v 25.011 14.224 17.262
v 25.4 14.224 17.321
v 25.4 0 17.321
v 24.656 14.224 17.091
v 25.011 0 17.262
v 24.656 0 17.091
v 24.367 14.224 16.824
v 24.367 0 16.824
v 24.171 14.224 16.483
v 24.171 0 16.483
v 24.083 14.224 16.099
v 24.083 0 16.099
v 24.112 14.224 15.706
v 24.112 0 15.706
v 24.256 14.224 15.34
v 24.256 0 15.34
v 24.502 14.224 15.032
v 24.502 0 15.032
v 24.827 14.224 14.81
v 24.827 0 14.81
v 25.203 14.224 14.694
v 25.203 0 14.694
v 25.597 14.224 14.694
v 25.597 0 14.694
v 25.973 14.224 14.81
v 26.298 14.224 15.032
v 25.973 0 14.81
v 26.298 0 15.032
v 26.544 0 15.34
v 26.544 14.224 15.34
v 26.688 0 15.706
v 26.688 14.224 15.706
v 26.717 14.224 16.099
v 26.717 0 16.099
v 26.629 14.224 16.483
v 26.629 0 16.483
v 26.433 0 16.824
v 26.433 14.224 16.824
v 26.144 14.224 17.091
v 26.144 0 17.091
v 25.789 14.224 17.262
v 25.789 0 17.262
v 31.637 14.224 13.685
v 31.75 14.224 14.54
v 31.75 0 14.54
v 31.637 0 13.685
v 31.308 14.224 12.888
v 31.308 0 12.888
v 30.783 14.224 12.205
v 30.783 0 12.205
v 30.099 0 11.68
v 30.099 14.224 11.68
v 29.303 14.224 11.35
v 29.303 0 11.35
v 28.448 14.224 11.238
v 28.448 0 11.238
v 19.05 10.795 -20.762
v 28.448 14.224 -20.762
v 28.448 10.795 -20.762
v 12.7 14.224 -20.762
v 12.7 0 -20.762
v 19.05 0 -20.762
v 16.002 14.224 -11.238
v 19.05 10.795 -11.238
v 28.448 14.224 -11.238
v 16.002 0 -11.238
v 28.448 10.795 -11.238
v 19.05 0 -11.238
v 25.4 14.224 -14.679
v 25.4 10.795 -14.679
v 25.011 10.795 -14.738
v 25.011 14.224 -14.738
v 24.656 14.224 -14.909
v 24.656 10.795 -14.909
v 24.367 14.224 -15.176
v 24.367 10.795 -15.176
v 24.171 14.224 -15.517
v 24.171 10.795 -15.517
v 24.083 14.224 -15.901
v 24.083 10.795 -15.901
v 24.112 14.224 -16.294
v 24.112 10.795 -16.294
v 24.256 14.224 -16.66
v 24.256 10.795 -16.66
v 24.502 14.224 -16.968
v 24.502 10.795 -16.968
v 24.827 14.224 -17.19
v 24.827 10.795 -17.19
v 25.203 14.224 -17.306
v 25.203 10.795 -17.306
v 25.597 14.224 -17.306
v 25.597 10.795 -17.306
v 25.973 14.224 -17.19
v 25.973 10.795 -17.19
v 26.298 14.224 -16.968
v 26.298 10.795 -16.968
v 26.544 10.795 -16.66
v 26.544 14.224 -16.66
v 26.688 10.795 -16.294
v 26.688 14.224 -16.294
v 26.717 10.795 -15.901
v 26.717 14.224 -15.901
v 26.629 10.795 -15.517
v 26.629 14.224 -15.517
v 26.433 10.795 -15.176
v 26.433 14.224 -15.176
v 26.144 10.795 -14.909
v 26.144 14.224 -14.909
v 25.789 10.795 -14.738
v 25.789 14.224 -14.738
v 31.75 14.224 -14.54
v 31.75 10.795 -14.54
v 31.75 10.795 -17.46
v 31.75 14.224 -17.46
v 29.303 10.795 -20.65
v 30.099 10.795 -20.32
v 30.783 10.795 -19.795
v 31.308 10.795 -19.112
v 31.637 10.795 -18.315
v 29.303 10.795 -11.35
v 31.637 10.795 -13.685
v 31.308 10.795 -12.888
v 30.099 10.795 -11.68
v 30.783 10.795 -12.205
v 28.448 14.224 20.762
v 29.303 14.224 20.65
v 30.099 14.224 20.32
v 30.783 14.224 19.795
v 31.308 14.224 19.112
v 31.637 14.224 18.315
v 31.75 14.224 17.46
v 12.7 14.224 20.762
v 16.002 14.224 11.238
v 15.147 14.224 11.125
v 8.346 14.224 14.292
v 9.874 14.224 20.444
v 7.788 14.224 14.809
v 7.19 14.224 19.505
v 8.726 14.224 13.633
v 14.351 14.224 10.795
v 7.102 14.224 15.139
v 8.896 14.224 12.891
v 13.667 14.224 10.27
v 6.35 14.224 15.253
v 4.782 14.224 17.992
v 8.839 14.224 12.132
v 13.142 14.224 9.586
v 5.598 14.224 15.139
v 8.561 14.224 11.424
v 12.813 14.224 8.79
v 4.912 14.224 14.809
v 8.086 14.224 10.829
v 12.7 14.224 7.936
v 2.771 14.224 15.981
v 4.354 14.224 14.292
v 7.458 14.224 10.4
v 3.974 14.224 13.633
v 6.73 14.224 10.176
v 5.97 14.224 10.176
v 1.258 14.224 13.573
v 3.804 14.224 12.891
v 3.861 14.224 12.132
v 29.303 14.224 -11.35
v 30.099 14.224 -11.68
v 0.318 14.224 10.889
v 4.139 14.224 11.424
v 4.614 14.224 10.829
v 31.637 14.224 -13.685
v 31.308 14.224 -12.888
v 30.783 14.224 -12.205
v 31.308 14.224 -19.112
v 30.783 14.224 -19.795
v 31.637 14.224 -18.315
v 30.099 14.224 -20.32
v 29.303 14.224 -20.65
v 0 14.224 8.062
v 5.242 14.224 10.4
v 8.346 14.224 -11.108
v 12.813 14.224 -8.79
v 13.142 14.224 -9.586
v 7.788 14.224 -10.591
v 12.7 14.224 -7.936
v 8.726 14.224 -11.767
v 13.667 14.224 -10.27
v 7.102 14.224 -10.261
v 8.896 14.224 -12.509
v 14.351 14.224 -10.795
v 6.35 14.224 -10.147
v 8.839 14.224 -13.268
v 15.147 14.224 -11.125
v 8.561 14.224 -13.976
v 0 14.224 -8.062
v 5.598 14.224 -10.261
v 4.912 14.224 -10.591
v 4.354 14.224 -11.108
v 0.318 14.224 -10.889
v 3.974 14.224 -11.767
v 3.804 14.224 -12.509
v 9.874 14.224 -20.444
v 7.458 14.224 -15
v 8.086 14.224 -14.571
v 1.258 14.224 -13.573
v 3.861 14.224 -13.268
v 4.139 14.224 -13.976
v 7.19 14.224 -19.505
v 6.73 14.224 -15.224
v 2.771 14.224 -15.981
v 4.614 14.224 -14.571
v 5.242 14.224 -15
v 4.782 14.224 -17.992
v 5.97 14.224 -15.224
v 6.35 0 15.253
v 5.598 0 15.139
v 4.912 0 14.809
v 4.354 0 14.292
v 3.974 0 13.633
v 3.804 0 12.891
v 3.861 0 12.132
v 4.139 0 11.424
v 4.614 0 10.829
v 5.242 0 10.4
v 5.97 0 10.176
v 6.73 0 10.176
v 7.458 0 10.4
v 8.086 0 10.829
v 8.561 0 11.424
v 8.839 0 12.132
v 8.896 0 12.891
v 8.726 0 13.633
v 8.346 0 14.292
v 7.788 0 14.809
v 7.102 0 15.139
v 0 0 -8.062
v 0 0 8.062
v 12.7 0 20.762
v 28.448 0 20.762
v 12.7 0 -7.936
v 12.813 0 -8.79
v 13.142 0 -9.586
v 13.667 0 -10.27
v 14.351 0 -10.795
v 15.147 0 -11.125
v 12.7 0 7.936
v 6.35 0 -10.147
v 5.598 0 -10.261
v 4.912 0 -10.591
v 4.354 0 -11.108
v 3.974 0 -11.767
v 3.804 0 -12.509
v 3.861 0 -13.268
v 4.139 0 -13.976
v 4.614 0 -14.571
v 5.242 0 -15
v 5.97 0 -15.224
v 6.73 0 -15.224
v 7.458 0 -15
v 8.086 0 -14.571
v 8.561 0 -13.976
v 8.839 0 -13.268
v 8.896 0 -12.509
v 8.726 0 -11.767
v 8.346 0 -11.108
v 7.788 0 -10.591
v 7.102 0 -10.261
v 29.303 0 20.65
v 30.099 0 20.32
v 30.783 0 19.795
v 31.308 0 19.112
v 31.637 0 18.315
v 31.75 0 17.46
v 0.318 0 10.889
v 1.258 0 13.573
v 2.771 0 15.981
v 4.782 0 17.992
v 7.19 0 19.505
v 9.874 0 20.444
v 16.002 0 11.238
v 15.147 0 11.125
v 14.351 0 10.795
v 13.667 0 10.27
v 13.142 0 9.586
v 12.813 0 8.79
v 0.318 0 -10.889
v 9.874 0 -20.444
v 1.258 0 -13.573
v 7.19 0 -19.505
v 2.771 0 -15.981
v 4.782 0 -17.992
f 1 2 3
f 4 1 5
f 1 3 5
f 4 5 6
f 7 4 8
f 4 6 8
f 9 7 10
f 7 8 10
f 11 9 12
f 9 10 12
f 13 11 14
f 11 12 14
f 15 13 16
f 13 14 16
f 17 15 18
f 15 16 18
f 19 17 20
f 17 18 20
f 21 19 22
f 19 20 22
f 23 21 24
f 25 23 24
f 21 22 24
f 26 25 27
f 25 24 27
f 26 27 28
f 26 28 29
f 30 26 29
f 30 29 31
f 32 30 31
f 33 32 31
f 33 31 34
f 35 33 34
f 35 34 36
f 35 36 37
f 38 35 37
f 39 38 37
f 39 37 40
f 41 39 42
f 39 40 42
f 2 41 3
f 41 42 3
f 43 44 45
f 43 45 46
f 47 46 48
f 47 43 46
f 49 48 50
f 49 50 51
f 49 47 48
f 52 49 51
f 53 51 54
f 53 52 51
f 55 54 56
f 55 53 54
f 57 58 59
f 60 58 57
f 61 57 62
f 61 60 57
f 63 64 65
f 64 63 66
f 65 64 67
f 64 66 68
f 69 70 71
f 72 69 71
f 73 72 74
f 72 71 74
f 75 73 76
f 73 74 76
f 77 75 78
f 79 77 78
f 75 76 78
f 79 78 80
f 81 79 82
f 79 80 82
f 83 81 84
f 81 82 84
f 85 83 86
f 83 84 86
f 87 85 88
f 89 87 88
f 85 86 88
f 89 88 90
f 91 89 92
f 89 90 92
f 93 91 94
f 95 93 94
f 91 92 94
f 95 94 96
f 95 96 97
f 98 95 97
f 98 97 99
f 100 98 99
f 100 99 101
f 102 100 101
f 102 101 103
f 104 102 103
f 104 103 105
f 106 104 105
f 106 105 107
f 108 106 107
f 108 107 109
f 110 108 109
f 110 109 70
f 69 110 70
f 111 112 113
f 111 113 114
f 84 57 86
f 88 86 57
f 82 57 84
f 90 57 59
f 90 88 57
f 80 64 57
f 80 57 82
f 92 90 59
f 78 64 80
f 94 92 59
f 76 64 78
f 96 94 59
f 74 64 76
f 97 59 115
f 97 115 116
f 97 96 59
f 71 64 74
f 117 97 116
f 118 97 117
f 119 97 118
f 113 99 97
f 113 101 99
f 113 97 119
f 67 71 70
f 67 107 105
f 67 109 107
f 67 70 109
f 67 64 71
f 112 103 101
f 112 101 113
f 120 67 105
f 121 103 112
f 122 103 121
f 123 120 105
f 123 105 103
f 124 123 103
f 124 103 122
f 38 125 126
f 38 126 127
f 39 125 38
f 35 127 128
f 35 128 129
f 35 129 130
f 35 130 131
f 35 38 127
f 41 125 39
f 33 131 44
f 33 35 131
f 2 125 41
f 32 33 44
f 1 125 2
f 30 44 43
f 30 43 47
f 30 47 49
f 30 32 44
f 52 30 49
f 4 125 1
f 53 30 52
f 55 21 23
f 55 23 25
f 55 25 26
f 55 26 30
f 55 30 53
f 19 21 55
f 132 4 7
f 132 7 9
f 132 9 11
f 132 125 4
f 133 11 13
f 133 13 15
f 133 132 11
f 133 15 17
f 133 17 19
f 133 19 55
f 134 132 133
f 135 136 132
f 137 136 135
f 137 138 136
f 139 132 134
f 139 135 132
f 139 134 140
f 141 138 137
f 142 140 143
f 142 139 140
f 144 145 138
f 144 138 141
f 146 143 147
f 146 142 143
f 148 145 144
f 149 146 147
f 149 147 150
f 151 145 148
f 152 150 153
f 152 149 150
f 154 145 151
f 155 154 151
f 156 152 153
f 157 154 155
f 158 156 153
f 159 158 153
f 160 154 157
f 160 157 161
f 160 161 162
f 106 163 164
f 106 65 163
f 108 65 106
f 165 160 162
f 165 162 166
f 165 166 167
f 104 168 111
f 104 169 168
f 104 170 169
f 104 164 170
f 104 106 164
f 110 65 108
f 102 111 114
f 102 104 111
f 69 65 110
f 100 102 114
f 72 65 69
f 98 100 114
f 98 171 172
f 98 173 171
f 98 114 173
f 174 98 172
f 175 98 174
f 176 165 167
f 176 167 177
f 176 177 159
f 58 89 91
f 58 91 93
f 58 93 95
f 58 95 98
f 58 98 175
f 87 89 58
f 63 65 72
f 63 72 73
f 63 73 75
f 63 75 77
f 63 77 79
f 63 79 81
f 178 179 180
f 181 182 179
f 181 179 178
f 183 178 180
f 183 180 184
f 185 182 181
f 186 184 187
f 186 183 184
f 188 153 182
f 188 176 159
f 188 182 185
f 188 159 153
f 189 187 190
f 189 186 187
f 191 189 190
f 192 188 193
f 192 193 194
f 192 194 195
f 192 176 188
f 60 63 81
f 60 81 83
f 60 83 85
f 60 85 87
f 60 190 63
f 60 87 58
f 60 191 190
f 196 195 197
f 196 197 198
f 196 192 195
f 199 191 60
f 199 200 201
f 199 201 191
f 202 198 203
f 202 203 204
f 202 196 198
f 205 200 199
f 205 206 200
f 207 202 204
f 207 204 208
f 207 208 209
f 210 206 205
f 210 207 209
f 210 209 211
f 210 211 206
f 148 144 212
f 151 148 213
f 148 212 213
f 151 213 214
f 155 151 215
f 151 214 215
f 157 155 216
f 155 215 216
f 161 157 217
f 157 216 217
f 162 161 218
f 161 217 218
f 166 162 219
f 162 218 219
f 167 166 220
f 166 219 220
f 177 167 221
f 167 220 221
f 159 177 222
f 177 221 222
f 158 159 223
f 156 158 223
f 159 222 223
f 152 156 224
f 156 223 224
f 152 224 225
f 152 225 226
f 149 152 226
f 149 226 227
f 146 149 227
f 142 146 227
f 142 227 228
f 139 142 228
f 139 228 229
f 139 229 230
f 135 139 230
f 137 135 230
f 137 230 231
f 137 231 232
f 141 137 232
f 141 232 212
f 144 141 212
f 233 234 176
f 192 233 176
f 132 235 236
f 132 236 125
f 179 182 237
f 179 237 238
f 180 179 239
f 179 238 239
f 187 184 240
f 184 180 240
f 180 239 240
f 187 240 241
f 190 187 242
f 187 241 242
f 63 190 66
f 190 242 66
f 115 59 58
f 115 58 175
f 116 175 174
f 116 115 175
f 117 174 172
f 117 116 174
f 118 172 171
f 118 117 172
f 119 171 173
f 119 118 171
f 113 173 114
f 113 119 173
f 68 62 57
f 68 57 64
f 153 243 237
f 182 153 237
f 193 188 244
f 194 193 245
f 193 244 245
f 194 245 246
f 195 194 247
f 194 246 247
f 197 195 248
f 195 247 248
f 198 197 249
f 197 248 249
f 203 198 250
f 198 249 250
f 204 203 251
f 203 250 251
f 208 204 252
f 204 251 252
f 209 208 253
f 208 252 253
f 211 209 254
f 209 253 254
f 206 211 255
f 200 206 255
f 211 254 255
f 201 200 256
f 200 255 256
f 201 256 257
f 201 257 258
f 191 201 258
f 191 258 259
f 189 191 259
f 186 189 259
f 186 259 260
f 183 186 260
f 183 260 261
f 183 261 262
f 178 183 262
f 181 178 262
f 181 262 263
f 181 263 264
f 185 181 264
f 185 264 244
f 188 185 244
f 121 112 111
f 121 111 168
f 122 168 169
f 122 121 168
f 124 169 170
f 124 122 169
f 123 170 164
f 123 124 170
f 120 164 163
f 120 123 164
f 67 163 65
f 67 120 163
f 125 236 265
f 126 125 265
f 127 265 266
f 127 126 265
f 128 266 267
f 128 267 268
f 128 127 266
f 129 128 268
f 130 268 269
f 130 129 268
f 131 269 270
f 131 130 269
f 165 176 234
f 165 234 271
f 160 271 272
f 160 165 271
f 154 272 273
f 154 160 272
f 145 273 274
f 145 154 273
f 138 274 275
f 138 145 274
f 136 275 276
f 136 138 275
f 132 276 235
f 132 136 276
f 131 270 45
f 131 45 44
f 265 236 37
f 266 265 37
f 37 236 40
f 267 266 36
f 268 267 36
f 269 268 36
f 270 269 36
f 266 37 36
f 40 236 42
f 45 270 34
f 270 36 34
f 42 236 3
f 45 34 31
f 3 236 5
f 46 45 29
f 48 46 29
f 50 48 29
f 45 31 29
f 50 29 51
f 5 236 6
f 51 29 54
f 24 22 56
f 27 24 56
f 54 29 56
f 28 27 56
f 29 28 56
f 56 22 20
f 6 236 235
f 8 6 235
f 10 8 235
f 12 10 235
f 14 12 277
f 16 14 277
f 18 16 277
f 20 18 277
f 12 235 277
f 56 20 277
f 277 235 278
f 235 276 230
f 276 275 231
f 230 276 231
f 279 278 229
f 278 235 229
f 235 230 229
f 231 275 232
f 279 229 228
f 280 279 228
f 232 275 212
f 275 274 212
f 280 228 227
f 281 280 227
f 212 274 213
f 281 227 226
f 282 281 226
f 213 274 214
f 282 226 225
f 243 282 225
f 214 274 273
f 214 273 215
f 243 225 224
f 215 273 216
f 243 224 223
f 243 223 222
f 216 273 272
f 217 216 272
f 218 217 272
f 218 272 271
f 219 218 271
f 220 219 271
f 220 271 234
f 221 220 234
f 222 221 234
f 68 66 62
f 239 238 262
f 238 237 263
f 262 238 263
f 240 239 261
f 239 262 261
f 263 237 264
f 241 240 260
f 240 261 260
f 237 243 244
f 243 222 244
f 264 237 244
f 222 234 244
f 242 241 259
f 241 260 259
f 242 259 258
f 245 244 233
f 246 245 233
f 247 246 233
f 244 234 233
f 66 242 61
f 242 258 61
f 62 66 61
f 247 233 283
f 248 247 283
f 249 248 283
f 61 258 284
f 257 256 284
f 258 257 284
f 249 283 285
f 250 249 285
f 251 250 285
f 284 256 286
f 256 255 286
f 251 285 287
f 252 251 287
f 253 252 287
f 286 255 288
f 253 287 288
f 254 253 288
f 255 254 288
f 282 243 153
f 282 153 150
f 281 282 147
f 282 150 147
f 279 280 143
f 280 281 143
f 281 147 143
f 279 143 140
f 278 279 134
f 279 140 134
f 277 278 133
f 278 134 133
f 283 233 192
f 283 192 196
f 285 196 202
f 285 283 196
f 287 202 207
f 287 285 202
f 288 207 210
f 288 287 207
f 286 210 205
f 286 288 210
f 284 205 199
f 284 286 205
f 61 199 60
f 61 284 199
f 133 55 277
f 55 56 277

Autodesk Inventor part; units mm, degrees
ref_plane "YZ Plane" through (0, 0, 0) normal (1, 0, 0) x (0, 1, 0)
ref_plane "XZ Plane" through (0, 0, 0) normal (0, 1, 0) x (-1, 0, 0)
ref_plane "XY Plane" through (0, 0, 0) normal (0, 0, 1) x (1, 0, 0)
sketch "Sketch1" plane through (0, 0, 0) normal (1, 0, 0) x (0, 1, 0)
  line L0 (0, 20.7625) -> (0, -20.7625)
  line L1 (0, 20.7625) -> (14.224, 20.7625)
  line L2 (14.224, 20.7625) -> (14.224, 11.2375)
  line L3 (14.224, 11.2375) -> (6.35, 11.2375)
  line L4 (6.35, 11.2375) -> (6.35, -11.2375)
  line L5 (6.35, -11.2375) -> (14.224, -11.2375)
  line L6 (14.224, -11.2375) -> (14.224, -20.7625)
  line L7 (14.224, -20.7625) -> (0, -20.7625)
  point P0 (0, 0)
  point P1 (0, 0)
  point P2 (14.224, -16)
  point P3 (14.224, 16)
  dimension "d1" = 32
  dimension "d2" = 7.874
  dimension "d4" = 6.35
  dimension "d5" = 9.525
extrude "Extrusion1" add sketch "Sketch1" along normal blind 31.75
sketch "Sketch2" plane through (0, 14.224, 20.7625) normal (0, 1, 0) x (1, 0, 0)
  line L0 (0, 9.525) -> (31.75, 9.525) construction
  line L1 (31.75, 9.525) -> (31.75, 0) construction
  line L2 (31.75, 0) -> (0, 0) construction
  line L3 (0, 0) -> (0, 9.525) construction
  line L4 (0, 41.525) -> (31.75, 41.525) construction
  line L5 (31.75, 41.525) -> (31.75, 32) construction
  line L6 (31.75, 32) -> (0, 32) construction
  line L7 (0, 32) -> (0, 41.525) construction
  point P0 (0, 20.7625)
  point P1 (25.4, 4.7625)
  point P2 (25.4, 36.7625)
  point P3 (31.75, 4.7625)
  point P4 (31.75, 36.7625)
  dimension "d8" = 6.35
hole "Hole1" at (25.4, 14.224, 16) at (25.4, 14.224, -16) direction (0, -1, 0) diameter 2.6416 end through all thread size "6-32 UNC" class "2B" standard "ANSI Unified Screw Threads"
sketch "Sketch4" plane through (0, 6.35, 11.2375) normal (0, 1, 0) x (1, 0, 0)
  circle A0 centre (25.4, -4.7625) radius 1.3208 construction
  circle A1 centre (25.4, 27.2375) radius 1.3208 construction
  line L0 (0, 32) -> (31.75, 32) construction
  line L1 (31.75, 32) -> (31.75, 22.475) construction
  line L2 (31.75, 22.475) -> (0, 22.475) construction
  line L3 (0, 0) -> (0, 22.475) construction
  line L4 (0, 0) -> (31.75, 0) construction
  line L5 (31.75, 0) -> (31.75, -9.525) construction
  line L6 (31.75, -9.525) -> (0, -9.525) construction
  line L7 (0, -9.525) -> (0, 0) construction
  line L8 (0, 22.475) -> (0, 32) construction
  line L9 (31.75, 22.475) -> (31.75, 0) construction
  line L10 (0, 22.475) -> (31.75, 22.475) construction
  line L11 (31.75, 0) -> (12.7, 0)
  line L12 (12.7, 0) -> (12.7, 22.475)
  line L13 (12.7, 22.475) -> (31.75, 22.475)
  line L14 (31.75, 22.475) -> (31.75, 0)
  point P0 (0, 11.2375)
  point P1 (14.7922, 22.475)
  dimension "d25" = 19.05
extrude "Extrusion2" cut sketch "Sketch4" along normal mid plane 38.1
sketch "Sketch5" plane through (0, 14.224, 20.7625) normal (0, 1, 0) x (1, 0, 0)
  line L0 (0, 0) -> (0, 41.525) construction
  line L1 (0, 41.525) -> (31.75, 41.525) construction
  line L2 (0, 41.525) -> (12.7, 41.525)
  line L3 (12.7, 41.525) -> (12.7, 0.1925)
  line L4 (12.7, 0.1925) -> (0, 0.1925)
  line L5 (0, 0.1925) -> (0, 41.525)
  line L6 (12.7, 9.525) -> (12.7, 32) construction
  point P0 (0, 20.7625)
extrude "Extrusion3" add sketch "Sketch5" against normal up to surface (7.874 mm away)
sketch "Sketch6" plane through (0, 14.224, 20.7625) normal (0, 1, 0) x (1, 0, 0)
  line L0 (6.35, 8.0625) -> (6.35, 33.4625) construction
  line L1 (0, 41.525) -> (0, 0) construction
  point P0 (0, 20.7625)
  point P1 (6.35, 20.7625)
  point P2 (0, 20.7625)
  dimension "d30" = 6.35
  dimension "d31" = 25.4
hole "Hole3" at (6.35, 14.224, 12.7) at (6.35, 14.224, -12.7) direction (0, -1, 0) diameter 5.1054 end through all clearance for "Flat Head Machine Screw (82)" size "#10" standard "Ansi Unified Screw Threads"
fillet "Fillet1" radius 12.7 2 edges at (0, 7.112, -20.7625) (0, 7.112, 20.7625)
fillet "Fillet2" radius 3.302 6 edges at (12.7, 7.112, -11.2375) (12.7, 7.112, 11.2375) (31.75, 7.112, 20.7625) (31.75, 7.112, 11.2375) (31.75, 7.112, -11.2375) (31.75, 7.112, -20.7625)
sketch "Sketch7" plane through (0, 0, -8.0625) normal (0, -1, 0) x (1, 0, 0)
  arc A0 (16.002, 19.3) -> (12.7, 15.998) centre (16.002, 15.998) ccw construction
  line L0 (12.7, 15.998) -> (12.7, 0.127) construction
  arc A1 (12.7, 0.127) -> (16.002, -3.175) centre (16.002, 0.127) ccw construction
  line L1 (16.002, -3.175) -> (28.448, -3.175) construction
  arc A2 (31.75, -6.477) -> (28.448, -3.175) centre (28.448, -6.477) ccw projected
  line L2 (31.75, -6.477) -> (31.75, -9.398) projected
  arc A3 (28.448, -12.7) -> (31.75, -9.398) centre (28.448, -9.398) ccw projected
  line L3 (28.448, -12.7) -> (12.7, -12.7) construction
  arc A4 (0, 0) -> (12.7, -12.7) centre (12.7, 0) ccw construction
  line L4 (0, 0) -> (0, 16.125) construction
  arc A5 (12.7, 28.825) -> (0, 16.125) centre (12.7, 16.125) ccw construction
  line L5 (12.7, 28.825) -> (28.448, 28.825) construction
  arc A6 (31.75, 25.523) -> (28.448, 28.825) centre (28.448, 25.523) ccw construction
  line L6 (31.75, 25.523) -> (31.75, 22.602) construction
  arc A7 (28.448, 19.3) -> (31.75, 22.602) centre (28.448, 22.602) ccw construction
  line L7 (28.448, 19.3) -> (16.002, 19.3) construction
  circle A8 centre (6.35, 20.7625) radius 2.5527 construction
  circle A9 centre (6.35, -4.6375) radius 2.5527 construction
  circle A10 centre (25.4, 24.0625) radius 1.3208 construction
  circle A11 centre (25.4, -7.9375) radius 1.3208 projected
  line L8 (12.7, -12.7) -> (28.448, -12.7) construction
  line L9 (28.448, -12.7) -> (19.05, -12.7)
  line L10 (19.05, -12.7) -> (19.05, -3.175)
  line L11 (16.002, -3.175) -> (28.448, -3.175) construction
  line L12 (19.05, -3.175) -> (28.448, -3.175)
  point P0 (0, 8.0625)
  dimension "d41" = 12.7
extrude "Extrusion4" cut sketch "Sketch7" against normal blind 10.795
properties part number "GP7-006" material "Aluminum 6061"
